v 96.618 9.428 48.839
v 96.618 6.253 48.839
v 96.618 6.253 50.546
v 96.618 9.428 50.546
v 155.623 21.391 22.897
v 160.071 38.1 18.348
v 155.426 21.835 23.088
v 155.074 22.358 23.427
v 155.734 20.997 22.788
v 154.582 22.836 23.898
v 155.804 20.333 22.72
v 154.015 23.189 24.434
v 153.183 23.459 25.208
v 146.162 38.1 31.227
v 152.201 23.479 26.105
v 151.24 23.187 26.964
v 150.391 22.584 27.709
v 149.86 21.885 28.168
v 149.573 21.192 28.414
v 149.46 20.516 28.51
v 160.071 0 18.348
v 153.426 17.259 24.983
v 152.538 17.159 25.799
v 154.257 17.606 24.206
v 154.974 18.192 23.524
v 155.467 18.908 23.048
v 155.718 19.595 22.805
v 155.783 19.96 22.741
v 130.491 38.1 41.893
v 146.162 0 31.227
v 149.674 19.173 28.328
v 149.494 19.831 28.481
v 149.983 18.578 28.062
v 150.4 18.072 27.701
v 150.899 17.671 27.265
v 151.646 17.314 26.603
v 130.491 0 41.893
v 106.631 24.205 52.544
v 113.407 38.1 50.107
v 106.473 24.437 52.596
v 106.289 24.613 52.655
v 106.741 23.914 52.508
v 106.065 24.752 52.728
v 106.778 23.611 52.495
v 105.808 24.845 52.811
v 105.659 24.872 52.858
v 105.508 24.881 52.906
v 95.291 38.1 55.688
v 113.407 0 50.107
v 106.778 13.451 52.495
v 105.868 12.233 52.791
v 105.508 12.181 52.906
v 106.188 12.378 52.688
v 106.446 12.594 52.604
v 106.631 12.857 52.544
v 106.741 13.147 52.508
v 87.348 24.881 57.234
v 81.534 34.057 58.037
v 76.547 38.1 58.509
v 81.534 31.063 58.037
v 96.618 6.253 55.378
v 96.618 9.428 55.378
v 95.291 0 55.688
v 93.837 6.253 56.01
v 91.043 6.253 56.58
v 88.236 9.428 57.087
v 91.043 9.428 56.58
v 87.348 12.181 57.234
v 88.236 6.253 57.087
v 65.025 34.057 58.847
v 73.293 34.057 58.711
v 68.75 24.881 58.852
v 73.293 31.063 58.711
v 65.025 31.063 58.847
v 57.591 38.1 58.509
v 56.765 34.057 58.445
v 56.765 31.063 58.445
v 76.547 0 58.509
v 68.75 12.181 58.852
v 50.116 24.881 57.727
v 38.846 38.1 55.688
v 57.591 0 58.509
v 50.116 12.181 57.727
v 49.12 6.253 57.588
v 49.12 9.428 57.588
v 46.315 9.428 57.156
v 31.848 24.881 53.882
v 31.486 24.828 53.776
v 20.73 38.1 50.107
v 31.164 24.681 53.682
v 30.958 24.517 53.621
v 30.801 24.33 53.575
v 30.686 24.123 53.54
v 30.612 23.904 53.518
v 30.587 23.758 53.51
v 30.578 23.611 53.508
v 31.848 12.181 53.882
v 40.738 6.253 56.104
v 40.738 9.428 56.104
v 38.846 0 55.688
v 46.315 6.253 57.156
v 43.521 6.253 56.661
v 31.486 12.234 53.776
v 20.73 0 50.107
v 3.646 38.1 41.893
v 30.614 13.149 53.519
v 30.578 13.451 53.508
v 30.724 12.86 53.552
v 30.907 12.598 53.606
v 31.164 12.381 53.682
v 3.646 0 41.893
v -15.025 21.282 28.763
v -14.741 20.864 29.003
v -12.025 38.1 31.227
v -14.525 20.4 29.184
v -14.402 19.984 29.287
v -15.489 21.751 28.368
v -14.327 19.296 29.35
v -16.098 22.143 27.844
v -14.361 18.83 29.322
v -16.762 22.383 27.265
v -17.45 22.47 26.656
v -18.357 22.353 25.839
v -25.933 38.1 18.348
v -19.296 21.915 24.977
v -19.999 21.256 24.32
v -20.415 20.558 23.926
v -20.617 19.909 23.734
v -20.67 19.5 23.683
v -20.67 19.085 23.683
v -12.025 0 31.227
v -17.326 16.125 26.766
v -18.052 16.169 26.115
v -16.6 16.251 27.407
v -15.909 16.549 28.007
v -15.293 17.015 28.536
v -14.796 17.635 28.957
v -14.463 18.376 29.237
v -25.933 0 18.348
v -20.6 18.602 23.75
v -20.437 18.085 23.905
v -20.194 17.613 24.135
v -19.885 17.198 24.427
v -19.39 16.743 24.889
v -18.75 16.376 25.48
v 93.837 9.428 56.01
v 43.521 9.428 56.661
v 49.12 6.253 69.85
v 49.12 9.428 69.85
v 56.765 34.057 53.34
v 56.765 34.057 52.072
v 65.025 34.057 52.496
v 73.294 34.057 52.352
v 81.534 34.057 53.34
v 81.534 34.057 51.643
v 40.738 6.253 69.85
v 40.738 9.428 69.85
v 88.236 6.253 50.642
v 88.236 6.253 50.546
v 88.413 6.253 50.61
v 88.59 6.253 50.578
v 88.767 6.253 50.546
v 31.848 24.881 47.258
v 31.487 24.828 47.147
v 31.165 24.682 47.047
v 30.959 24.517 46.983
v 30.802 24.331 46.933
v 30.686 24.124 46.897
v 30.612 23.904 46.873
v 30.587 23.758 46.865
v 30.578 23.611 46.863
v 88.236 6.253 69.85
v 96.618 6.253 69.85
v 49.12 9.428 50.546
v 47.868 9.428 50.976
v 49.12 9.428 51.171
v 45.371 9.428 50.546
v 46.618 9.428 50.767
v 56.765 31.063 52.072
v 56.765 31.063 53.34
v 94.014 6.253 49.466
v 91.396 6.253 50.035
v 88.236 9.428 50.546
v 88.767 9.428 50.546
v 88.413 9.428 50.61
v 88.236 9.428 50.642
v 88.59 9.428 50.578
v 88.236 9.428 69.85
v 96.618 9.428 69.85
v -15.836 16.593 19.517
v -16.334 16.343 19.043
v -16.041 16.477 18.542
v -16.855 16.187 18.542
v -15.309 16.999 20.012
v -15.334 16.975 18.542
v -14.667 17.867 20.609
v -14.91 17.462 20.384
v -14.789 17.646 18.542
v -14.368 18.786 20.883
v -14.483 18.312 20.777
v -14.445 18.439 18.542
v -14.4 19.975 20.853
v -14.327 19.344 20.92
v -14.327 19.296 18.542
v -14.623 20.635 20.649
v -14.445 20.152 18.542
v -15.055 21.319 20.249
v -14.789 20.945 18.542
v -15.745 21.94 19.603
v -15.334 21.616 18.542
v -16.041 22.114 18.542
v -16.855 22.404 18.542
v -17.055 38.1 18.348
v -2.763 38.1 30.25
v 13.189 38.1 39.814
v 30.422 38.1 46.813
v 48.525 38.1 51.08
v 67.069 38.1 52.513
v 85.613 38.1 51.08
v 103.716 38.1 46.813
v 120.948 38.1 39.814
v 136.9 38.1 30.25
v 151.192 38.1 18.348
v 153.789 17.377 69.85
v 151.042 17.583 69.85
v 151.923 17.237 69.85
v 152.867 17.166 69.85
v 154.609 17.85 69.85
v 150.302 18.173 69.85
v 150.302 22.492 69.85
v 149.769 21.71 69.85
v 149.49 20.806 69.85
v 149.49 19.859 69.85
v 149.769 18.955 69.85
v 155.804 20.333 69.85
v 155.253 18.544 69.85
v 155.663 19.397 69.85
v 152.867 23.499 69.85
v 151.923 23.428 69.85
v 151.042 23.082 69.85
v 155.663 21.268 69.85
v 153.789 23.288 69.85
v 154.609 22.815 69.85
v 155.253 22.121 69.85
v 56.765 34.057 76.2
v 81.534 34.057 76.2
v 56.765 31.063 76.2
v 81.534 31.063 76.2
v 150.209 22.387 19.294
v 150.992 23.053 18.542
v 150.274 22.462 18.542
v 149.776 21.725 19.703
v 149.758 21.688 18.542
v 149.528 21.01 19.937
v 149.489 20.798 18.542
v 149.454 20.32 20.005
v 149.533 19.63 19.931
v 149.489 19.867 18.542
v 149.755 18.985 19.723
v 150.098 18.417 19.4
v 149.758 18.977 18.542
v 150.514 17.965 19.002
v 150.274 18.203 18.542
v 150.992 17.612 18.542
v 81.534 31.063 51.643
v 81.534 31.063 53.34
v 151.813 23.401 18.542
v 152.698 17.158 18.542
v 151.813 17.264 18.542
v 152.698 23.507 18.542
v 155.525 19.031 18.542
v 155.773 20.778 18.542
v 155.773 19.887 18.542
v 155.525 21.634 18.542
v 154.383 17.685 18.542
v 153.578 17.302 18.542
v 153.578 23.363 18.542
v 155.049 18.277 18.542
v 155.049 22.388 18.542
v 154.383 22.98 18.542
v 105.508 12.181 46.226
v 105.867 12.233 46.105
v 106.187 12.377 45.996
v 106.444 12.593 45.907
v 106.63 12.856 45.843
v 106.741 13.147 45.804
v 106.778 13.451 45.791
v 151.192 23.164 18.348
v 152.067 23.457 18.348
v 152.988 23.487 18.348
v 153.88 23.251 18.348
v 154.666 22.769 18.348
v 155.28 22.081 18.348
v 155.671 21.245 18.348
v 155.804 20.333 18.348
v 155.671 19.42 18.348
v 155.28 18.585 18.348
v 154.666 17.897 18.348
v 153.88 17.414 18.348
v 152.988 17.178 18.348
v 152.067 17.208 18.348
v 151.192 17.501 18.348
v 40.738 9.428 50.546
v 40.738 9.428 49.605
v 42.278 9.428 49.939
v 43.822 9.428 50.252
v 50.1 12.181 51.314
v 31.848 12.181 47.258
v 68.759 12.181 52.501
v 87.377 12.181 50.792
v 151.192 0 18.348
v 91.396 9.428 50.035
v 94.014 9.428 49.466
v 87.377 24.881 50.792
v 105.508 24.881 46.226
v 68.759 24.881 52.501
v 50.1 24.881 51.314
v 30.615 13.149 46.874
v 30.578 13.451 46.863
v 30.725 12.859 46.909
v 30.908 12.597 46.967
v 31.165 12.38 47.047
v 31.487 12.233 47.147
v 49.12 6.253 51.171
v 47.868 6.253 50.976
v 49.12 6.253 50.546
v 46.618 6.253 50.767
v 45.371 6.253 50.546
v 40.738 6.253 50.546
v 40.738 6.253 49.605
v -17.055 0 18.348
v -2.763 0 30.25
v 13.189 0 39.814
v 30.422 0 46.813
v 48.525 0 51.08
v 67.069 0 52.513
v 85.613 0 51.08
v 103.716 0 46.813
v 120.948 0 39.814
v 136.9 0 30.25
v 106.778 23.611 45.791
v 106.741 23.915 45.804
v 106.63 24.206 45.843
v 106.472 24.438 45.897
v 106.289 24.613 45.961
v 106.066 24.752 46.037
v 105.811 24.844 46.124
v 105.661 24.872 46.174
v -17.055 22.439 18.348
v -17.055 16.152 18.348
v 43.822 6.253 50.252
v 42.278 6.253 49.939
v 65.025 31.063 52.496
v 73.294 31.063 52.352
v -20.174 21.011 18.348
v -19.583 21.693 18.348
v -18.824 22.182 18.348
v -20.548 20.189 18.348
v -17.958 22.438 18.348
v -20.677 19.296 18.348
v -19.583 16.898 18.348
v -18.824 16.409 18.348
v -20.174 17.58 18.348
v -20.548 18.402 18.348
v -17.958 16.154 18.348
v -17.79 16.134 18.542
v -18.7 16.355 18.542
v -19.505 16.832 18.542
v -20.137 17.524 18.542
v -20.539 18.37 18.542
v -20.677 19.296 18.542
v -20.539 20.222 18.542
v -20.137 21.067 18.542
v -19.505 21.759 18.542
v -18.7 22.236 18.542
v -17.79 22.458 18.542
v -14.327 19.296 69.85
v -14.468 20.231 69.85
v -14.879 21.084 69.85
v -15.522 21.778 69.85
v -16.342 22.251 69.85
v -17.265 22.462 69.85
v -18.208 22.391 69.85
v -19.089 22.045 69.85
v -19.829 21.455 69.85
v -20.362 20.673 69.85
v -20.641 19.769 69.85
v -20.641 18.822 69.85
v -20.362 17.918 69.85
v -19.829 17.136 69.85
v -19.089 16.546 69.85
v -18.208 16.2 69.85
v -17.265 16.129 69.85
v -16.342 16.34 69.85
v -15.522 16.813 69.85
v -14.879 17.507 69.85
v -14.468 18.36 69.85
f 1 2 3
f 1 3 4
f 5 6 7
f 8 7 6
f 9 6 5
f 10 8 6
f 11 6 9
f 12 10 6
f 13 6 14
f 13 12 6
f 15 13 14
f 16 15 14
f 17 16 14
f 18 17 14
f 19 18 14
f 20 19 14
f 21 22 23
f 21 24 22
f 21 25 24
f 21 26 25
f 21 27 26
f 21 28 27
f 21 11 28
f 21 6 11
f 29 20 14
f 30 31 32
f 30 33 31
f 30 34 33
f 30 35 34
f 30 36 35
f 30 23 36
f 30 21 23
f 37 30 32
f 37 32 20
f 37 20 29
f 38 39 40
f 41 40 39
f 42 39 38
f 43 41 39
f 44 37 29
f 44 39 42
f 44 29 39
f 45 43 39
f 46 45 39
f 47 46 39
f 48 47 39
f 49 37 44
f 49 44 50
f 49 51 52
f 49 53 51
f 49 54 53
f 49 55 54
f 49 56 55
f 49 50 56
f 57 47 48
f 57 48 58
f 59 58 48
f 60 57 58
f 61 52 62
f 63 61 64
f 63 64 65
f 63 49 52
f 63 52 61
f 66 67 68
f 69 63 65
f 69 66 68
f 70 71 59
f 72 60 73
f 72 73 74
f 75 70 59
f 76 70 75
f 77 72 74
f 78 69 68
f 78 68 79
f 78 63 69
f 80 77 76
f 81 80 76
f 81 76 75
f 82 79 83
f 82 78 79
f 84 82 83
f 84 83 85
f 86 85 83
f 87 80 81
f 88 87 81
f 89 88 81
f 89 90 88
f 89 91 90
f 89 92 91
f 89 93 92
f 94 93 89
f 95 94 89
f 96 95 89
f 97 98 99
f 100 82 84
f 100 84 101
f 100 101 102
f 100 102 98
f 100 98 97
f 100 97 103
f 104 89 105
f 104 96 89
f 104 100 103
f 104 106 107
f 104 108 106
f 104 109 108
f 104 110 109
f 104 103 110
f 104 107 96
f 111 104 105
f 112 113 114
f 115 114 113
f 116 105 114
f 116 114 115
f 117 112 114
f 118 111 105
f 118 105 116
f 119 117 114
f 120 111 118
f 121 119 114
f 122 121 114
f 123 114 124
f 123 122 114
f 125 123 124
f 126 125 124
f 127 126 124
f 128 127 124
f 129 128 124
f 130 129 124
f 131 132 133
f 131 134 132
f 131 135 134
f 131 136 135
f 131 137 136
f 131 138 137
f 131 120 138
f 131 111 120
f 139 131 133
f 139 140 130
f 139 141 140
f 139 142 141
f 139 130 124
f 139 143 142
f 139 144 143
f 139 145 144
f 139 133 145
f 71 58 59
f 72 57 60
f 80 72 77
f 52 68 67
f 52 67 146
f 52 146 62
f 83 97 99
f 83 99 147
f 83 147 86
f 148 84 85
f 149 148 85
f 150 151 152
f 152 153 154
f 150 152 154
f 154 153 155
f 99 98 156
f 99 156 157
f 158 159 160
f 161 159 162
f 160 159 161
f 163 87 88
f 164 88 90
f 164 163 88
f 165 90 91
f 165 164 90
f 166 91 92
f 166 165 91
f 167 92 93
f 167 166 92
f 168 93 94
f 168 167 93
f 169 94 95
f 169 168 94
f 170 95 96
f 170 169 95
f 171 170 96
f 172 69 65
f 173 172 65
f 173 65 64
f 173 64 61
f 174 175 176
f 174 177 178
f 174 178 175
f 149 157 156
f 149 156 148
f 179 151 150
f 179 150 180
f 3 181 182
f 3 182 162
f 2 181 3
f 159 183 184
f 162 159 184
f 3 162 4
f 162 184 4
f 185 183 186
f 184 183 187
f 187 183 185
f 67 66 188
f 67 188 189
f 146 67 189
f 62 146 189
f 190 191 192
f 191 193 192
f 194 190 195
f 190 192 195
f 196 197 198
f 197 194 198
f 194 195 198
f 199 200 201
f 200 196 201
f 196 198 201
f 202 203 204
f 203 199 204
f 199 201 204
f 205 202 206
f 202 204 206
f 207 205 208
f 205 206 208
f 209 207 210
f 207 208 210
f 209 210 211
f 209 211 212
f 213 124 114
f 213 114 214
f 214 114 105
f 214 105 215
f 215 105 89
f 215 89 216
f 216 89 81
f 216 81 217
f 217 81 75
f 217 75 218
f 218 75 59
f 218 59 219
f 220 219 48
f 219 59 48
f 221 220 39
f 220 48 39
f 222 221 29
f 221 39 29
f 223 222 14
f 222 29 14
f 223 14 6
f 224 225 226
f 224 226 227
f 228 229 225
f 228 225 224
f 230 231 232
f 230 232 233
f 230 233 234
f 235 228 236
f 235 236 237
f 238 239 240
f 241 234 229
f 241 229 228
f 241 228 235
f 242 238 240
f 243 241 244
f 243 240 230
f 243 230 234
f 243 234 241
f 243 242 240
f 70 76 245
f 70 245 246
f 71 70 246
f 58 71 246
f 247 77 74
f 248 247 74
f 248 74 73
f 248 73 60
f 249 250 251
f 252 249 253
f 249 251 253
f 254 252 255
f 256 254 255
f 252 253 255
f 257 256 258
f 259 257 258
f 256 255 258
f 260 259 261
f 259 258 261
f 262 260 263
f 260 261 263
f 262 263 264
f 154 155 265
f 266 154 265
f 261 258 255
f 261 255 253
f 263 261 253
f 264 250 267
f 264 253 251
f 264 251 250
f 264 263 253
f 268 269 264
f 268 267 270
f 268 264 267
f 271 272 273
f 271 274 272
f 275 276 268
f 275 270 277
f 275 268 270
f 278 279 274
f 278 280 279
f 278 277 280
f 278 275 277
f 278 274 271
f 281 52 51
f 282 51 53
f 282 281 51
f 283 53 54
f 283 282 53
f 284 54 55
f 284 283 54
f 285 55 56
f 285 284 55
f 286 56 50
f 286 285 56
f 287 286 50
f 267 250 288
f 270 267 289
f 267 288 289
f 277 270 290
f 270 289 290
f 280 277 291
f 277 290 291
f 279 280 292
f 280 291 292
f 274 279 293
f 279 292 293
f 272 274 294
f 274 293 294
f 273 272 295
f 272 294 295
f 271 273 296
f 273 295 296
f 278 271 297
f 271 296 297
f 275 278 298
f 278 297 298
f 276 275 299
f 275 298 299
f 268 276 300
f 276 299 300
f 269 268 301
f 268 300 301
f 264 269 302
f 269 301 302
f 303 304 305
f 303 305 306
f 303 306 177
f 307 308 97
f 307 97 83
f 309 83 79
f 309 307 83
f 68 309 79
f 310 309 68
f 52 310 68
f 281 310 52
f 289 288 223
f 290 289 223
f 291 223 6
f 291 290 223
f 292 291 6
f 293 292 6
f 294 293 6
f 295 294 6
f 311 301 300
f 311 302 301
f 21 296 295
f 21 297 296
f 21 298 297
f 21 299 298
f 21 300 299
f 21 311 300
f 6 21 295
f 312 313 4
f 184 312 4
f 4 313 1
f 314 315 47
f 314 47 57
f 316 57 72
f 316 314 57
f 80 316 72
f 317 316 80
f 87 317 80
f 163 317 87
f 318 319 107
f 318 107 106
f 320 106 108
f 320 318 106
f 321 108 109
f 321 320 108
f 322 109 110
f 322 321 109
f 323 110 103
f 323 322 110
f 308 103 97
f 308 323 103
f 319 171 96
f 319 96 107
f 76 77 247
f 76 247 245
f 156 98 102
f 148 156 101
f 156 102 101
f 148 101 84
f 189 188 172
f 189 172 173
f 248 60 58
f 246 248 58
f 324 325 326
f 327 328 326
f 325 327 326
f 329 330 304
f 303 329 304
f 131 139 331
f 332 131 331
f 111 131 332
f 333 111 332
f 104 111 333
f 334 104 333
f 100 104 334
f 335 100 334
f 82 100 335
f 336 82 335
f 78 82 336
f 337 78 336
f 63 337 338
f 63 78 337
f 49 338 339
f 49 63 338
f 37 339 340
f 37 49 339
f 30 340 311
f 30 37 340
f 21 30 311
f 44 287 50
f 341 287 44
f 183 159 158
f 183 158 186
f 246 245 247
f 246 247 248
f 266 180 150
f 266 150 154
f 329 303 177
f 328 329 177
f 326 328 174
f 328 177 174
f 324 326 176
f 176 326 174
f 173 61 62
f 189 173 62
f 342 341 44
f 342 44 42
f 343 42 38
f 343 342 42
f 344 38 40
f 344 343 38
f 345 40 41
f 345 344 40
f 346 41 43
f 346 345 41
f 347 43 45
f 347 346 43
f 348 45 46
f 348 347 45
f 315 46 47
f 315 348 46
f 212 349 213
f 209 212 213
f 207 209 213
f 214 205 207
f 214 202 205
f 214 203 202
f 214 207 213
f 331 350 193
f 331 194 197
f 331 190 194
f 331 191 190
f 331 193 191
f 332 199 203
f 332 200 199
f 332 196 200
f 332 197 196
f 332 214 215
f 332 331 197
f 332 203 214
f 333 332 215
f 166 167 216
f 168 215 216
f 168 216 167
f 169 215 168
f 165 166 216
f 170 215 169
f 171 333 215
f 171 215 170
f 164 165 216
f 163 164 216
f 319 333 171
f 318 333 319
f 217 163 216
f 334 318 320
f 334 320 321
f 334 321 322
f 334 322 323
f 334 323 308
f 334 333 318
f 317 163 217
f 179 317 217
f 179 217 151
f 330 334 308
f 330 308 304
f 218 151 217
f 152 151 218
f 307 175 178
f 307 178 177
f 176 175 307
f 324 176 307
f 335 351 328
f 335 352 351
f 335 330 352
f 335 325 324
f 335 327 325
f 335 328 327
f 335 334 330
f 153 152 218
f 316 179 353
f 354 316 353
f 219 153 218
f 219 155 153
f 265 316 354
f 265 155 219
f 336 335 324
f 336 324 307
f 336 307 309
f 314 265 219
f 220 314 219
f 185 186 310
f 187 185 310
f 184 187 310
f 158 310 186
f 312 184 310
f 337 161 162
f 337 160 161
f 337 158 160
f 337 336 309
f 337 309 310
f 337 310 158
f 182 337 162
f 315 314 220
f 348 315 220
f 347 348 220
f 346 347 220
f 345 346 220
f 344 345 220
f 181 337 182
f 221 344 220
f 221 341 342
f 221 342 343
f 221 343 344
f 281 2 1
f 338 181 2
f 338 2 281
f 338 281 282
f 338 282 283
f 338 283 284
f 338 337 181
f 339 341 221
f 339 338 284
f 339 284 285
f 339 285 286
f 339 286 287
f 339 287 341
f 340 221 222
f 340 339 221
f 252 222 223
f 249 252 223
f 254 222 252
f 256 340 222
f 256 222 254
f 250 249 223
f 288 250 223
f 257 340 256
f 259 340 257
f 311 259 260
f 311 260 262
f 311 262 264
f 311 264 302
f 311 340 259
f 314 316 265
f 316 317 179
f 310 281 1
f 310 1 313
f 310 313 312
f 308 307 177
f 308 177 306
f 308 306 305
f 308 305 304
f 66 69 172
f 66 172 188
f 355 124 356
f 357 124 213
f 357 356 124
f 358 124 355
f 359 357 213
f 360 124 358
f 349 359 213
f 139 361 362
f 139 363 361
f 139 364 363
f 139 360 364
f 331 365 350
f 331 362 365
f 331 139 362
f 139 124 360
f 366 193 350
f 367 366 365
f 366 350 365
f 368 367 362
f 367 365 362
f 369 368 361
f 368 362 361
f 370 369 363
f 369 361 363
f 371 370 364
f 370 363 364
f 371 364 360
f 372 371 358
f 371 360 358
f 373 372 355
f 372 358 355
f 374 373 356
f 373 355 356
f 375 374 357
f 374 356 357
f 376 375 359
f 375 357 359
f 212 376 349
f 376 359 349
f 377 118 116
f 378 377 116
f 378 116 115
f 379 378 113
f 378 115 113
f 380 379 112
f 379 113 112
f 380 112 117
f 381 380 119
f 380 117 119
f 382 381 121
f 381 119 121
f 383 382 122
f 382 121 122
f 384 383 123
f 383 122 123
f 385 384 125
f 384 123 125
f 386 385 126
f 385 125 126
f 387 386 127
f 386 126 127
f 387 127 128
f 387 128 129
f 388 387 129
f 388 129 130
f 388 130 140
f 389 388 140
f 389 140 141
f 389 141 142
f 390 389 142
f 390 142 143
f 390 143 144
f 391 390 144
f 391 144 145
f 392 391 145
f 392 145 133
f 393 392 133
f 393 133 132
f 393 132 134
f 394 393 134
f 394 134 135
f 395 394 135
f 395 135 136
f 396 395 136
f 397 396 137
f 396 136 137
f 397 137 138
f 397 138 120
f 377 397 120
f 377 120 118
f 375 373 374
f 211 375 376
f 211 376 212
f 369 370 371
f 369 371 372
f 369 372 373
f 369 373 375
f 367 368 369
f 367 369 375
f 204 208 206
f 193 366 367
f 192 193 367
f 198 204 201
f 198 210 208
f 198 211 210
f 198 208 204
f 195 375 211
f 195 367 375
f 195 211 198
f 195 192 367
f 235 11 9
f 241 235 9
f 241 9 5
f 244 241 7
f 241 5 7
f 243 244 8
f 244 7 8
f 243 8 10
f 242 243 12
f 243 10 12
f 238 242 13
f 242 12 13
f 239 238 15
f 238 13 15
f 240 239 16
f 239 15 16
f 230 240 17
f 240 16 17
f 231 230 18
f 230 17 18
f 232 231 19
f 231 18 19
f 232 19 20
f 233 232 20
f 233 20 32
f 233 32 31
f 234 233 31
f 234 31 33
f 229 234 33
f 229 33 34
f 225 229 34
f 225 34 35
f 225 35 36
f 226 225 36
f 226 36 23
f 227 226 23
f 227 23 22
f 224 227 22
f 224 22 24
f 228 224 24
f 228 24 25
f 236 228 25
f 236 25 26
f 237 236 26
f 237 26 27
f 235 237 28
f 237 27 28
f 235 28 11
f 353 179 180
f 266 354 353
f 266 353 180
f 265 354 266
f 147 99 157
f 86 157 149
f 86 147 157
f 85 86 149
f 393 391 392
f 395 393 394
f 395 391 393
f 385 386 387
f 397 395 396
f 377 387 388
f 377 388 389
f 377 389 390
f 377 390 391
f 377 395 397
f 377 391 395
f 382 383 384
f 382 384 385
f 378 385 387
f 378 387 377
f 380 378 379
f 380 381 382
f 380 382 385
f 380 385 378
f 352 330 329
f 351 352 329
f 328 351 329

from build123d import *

# Parameters (mm, degrees)
F1_DEPTH  = 38.1
F3_DEPTH  = 63.5
F4_R      = 3.175
F6_DEPTH  = 69.85
F6_FACE_R = 3.175
F7_DEPTH  = 18.542
F5_W      = 24.768822
F5_H      = 2.994034
F8_DEPTH  = 76.2
F8_FACE_W = 24.768822
F8_FACE_H = 2.994034
F9_DEPTH  = 53.34
F10_W     = 222.162876
F10_H     = 22.374636
F11_DEPTH = 50.8
F12_W     = 8.382
F12_H     = 3.175
F13_DEPTH = 69.85
F14_DEPTH = 50.546


with BuildPart() as f1:
    # F0 (on Front) → F1 (new body)
    with BuildSketch(Plane.XZ):
        with BuildLine():
            ThreePointArc((-32.499379, 0), (67.068651, 52.513153), (166.636681, 0))
            Line((166.636681, 0), (171.877104, 3.58615))
            ThreePointArc((171.877104, 3.58615), (67.068651, 58.863153), (-37.739801, 3.58615))
            Line((-37.739801, 3.58615), (-32.499379, 0))
        make_face()
    extrude(amount=-F1_DEPTH)

    # F2 (on Top) → F3 (cut)
    with BuildSketch(Plane.XY):
        with BuildLine():
            Line((105.508113, 24.880887), (31.848113, 24.880887))
            ThreePointArc((31.848113, 24.880887), (30.950088, 24.508913), (30.578113, 23.610887))
            Line((30.578113, 23.610887), (30.578113, 13.450887))
            ThreePointArc((30.578113, 13.450887), (30.950088, 12.552862), (31.848113, 12.180887))
            Line((31.848113, 12.180887), (105.508113, 12.180887))
            ThreePointArc((105.508113, 12.180887), (106.406139, 12.552862), (106.778113, 13.450887))
            Line((106.778113, 13.450887), (106.778113, 23.610887))
            ThreePointArc((106.778113, 23.610887), (106.406139, 24.508913), (105.508113, 24.880887))
        make_face()
    extrude(amount=F3_DEPTH, mode=Mode.SUBTRACT)

    # F4 (on Top) → F6 (join)
    with BuildSketch(Plane.XY):
        with Locations((-17.501814, 19.295603)):
            Circle(F4_R)
        with Locations((152.629465, 20.332575)):
            Circle(F4_R)
    extrude(amount=F6_DEPTH)

    # F6_face (on face) → F7 (cut)
    with BuildSketch(Plane(origin=(152.629465, 20.332575, 0), x_dir=(1, 0, 0), z_dir=(0, 0, -1))):
        Circle(F6_FACE_R)
        with Locations((-170.131279, 1.036972)):
            Circle(F6_FACE_R)
    extrude(amount=-F7_DEPTH, mode=Mode.SUBTRACT)

    # F5 (on Top) → F8 (join)
    with BuildSketch(Plane.XY):
        with Locations((69.149714, 32.560246)):
            Rectangle(F5_W, F5_H)
    extrude(amount=F8_DEPTH)

    # F8_face (on face) → F9 (cut)
    with BuildSketch(Plane(origin=(69.149714, 32.560246, 0), x_dir=(1, 0, 0), z_dir=(0, 0, -1))):
        Rectangle(F8_FACE_W, F8_FACE_H)
    extrude(amount=-F9_DEPTH, mode=Mode.SUBTRACT)

    # F10 (on Front) → F11 (cut)
    with BuildSketch(Plane.XZ):
        with Locations((66.641135, 7.16073)):
            Rectangle(F10_W, F10_H)
    extrude(amount=-F11_DEPTH, mode=Mode.SUBTRACT)

    # F12 (on Top) → F13 (join)
    with BuildSketch(Plane.XY):
        with Locations((44.929113, 7.840642)):
            Rectangle(F12_W, F12_H)
        with Locations((92.427113, 7.840642)):
            Rectangle(F12_W, F12_H)
    extrude(amount=F13_DEPTH)

    # F12 (on Top) → F14 (cut)
    with BuildSketch(Plane.XY):
        with Locations((44.929113, 7.840642)):
            Rectangle(F12_W, F12_H)
        with Locations((92.427113, 7.840642)):
            Rectangle(F12_W, F12_H)
    extrude(amount=F14_DEPTH, mode=Mode.SUBTRACT)


solid = f1.part
